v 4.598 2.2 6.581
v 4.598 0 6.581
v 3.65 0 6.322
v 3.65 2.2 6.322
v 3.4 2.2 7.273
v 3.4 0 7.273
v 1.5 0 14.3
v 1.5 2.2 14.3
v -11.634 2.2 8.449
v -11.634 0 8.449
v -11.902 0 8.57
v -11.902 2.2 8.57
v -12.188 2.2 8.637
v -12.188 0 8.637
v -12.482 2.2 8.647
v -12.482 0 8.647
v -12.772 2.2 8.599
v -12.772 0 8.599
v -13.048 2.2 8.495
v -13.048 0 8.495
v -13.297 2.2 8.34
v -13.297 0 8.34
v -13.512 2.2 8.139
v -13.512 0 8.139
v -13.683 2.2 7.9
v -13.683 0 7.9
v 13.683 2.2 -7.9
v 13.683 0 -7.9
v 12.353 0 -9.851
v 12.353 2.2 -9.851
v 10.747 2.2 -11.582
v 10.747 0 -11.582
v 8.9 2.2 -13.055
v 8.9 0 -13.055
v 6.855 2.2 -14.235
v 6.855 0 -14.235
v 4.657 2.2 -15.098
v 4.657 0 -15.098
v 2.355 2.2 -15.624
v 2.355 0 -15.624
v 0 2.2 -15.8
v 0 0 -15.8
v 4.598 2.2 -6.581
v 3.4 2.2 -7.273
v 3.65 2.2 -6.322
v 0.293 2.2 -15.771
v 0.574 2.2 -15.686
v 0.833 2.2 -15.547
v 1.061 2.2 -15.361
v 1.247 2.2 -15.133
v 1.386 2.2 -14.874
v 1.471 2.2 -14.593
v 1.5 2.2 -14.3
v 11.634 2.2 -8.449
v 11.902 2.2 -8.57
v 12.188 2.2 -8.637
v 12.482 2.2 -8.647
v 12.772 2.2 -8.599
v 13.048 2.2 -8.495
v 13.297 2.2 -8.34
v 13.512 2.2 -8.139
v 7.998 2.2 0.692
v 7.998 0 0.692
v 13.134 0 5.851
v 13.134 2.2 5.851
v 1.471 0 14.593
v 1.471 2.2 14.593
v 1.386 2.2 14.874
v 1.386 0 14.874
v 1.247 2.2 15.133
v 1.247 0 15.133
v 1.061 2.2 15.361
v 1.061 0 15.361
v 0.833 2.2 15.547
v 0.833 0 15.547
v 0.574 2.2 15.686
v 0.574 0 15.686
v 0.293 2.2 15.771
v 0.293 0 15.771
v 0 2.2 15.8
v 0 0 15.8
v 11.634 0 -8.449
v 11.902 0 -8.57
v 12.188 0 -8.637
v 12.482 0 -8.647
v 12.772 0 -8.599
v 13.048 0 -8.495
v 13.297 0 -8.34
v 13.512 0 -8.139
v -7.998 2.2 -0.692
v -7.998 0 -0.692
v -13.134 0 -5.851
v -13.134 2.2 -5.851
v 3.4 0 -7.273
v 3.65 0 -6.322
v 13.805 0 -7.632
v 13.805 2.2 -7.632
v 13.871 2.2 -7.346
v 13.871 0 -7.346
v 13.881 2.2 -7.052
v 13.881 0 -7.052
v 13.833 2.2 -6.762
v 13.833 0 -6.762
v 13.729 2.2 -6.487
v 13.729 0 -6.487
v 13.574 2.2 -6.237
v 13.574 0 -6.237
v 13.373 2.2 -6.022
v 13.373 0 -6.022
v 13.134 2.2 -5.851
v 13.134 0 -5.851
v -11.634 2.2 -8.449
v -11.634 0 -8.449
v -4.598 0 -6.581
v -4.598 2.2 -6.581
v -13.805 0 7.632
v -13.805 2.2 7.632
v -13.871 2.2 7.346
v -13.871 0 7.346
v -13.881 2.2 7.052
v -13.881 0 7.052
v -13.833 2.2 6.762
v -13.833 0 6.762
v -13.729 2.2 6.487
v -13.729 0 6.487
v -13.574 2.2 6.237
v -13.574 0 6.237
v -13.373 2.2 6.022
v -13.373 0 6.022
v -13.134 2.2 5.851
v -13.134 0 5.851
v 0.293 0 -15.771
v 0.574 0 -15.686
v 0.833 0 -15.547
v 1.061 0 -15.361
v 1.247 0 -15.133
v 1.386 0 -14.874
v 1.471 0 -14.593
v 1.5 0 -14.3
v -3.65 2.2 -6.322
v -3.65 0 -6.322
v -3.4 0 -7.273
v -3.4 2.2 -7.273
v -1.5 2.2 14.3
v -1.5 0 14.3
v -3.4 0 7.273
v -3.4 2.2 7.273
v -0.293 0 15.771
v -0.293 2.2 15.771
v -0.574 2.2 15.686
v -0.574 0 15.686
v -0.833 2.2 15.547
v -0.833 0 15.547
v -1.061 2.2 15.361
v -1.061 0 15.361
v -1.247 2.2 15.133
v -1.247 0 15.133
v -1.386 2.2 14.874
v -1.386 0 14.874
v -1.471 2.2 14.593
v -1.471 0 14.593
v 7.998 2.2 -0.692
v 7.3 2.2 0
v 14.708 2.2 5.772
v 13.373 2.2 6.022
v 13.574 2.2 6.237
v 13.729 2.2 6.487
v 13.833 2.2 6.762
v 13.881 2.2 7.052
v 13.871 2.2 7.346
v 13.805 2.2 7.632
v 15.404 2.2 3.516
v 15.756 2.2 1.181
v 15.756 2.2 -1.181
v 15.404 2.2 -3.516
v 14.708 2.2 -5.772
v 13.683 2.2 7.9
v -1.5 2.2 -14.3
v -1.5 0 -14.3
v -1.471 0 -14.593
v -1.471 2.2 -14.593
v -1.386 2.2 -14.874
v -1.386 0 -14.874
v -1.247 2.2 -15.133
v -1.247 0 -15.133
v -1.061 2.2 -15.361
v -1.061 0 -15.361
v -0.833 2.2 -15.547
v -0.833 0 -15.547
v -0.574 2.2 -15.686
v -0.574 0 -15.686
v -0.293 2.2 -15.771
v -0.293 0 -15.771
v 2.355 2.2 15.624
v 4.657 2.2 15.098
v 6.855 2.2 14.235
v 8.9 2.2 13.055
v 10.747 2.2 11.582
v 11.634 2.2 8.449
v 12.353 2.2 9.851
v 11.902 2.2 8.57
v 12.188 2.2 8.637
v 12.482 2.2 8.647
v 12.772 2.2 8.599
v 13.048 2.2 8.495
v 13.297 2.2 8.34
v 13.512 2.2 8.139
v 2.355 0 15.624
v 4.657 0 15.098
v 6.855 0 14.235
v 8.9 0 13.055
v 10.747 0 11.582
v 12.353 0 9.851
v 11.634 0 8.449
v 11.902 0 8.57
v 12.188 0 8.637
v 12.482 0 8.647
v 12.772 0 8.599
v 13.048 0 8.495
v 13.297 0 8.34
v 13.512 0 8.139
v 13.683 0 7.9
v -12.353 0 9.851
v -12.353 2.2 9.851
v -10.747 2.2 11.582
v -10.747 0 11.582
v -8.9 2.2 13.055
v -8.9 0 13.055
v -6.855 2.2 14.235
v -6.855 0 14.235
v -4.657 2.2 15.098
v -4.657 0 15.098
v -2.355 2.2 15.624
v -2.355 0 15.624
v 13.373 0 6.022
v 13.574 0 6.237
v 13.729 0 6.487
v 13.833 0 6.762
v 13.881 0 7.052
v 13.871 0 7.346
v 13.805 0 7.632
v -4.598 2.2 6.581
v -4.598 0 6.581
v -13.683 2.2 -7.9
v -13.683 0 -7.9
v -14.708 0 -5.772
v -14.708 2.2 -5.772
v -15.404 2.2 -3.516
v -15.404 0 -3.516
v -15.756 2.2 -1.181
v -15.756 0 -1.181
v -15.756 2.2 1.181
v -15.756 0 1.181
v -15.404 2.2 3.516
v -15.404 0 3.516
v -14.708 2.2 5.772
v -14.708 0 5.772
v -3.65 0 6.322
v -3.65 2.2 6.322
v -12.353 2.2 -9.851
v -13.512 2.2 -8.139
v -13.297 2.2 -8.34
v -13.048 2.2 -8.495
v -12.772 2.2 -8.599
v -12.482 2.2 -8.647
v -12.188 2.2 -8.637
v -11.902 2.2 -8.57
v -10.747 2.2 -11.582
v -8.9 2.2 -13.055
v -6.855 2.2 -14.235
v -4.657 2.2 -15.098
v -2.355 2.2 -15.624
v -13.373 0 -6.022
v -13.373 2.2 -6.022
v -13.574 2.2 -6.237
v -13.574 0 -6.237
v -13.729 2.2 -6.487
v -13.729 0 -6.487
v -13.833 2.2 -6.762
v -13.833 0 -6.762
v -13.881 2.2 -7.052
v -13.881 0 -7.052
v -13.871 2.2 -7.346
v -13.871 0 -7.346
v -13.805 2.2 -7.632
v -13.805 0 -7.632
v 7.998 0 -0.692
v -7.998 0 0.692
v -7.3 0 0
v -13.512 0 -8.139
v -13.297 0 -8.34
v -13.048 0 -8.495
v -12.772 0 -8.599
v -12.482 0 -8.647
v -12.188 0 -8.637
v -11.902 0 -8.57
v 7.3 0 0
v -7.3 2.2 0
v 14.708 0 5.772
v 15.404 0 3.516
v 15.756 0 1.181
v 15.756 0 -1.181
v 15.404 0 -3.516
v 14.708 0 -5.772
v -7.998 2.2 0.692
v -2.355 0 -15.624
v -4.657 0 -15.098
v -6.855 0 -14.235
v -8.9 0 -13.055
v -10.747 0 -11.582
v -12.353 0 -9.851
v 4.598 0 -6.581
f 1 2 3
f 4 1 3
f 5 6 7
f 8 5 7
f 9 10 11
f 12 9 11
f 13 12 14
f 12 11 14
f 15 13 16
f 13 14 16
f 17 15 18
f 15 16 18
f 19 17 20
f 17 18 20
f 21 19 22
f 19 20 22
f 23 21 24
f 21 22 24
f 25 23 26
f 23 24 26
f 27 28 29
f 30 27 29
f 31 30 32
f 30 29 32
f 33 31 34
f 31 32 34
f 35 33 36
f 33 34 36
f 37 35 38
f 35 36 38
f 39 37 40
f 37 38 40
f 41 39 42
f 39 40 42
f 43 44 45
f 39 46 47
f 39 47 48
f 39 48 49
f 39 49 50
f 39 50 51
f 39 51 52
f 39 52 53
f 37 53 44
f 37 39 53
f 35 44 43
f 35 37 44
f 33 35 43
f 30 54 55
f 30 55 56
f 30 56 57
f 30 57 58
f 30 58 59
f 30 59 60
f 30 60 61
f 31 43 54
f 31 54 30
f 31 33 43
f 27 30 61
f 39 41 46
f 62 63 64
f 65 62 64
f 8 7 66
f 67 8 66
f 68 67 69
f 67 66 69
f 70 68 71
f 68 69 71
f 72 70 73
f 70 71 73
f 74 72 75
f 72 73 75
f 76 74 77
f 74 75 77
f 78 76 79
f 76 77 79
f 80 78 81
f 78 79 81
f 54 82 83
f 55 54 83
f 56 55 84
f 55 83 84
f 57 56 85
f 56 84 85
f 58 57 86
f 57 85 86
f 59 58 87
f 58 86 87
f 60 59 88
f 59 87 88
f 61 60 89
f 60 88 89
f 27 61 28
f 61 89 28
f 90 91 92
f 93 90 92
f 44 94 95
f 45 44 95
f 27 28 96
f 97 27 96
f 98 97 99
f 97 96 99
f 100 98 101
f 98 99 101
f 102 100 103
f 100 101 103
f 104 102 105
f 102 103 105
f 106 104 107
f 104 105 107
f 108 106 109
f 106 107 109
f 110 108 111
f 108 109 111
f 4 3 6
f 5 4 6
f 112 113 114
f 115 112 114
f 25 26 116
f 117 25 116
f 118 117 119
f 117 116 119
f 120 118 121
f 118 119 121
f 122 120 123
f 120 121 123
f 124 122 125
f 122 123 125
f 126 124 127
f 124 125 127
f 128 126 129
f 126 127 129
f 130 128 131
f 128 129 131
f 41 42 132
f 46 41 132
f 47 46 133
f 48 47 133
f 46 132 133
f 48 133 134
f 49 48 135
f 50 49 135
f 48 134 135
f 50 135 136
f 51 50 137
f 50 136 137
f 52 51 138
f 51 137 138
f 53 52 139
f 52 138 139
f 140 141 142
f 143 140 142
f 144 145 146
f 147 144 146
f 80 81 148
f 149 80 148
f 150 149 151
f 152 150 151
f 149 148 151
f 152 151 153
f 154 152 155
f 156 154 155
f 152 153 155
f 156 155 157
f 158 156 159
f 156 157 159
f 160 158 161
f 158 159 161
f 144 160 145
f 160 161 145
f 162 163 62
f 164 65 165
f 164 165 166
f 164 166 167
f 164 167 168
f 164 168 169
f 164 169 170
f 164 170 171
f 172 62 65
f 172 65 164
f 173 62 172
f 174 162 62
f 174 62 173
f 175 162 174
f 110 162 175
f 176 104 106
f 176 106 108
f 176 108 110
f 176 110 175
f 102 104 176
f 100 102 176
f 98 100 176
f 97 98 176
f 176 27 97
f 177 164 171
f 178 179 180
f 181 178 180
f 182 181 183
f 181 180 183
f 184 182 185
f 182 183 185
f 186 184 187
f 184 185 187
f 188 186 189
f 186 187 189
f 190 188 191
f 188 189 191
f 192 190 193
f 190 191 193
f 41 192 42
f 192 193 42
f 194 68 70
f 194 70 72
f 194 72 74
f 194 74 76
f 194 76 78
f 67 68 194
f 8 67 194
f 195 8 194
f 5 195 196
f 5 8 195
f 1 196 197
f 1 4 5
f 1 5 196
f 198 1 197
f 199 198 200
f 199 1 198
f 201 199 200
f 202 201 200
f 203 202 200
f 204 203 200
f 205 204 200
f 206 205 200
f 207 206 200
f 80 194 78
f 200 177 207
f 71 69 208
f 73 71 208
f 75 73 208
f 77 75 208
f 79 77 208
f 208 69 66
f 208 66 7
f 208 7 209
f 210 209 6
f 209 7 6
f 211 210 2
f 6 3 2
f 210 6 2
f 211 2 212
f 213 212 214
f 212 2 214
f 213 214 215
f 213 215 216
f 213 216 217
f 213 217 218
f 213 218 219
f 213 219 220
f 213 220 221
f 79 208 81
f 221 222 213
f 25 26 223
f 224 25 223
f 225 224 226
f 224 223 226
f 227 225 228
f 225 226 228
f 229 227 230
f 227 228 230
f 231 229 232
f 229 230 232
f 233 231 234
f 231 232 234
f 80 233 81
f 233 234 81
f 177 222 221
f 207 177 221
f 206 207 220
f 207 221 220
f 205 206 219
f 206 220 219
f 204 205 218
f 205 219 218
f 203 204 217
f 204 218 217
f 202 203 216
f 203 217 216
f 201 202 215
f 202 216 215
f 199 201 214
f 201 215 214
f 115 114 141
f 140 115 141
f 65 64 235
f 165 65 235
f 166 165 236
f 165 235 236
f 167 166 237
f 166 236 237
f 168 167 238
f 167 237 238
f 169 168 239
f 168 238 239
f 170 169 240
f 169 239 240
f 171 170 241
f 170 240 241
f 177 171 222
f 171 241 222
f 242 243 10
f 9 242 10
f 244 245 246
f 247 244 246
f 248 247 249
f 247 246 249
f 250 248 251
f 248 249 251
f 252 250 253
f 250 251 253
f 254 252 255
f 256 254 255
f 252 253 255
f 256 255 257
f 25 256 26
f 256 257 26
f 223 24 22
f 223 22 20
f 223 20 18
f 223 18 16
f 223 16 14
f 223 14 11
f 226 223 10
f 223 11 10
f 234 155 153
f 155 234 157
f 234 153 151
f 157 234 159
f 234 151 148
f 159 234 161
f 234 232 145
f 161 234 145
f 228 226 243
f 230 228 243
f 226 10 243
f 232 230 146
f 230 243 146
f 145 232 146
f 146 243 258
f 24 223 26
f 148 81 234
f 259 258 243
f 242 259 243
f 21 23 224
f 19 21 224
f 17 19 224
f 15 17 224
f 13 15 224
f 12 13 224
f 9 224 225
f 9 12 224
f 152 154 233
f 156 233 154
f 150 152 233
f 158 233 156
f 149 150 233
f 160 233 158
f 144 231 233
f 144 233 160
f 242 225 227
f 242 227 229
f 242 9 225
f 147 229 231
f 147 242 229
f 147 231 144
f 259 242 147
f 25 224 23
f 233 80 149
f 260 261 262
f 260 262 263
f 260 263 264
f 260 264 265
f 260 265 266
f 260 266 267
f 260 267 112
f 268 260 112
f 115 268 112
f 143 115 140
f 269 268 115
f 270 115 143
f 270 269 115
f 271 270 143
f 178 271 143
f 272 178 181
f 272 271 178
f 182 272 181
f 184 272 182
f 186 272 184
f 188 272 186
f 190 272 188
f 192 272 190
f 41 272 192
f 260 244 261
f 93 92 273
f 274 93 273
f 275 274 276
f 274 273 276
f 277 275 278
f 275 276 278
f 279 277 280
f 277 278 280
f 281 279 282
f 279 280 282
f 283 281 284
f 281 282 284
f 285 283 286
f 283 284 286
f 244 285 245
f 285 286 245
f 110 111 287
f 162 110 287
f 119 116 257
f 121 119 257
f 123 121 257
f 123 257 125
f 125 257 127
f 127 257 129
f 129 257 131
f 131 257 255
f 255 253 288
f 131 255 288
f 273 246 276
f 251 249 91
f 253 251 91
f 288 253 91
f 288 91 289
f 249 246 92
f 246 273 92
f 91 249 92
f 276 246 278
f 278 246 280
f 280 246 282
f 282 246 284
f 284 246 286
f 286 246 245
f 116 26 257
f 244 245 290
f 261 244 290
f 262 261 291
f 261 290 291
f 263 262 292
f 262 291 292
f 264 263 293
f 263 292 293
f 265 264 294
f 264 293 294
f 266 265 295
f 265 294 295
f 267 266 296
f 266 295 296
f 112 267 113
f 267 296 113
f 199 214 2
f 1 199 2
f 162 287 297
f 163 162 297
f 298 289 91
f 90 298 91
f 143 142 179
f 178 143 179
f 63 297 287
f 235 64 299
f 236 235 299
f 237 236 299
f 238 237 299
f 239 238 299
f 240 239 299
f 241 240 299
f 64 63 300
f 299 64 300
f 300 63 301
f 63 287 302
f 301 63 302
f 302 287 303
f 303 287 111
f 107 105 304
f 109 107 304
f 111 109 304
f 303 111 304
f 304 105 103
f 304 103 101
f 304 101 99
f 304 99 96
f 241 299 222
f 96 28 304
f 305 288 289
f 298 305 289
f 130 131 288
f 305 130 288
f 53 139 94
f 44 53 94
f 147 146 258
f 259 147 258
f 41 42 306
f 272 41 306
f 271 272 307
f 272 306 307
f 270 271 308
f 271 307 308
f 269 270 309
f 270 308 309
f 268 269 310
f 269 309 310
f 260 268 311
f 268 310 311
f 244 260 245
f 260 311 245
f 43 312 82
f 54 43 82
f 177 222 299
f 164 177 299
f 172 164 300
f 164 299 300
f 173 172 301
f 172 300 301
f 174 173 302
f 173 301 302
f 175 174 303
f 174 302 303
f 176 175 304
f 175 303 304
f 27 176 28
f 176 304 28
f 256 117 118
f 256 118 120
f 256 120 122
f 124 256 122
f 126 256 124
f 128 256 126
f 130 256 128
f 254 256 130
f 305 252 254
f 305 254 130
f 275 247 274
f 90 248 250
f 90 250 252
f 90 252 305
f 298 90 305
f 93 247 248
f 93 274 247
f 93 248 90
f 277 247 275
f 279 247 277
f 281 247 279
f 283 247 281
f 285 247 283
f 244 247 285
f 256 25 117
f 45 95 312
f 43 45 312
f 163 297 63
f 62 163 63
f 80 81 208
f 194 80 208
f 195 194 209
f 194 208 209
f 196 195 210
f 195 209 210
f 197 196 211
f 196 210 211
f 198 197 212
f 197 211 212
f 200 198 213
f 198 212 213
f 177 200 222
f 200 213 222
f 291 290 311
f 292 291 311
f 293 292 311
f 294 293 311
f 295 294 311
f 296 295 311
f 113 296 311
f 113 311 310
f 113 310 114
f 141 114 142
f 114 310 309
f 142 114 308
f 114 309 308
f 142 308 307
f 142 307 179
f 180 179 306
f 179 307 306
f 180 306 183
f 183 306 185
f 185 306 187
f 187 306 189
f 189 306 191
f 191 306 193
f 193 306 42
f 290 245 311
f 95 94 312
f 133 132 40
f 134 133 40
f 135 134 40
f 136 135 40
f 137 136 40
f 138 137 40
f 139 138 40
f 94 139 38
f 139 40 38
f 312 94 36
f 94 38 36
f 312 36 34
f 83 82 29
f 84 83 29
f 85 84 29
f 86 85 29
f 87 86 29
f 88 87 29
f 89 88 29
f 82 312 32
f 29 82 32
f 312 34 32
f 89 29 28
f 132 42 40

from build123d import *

# Parameters (mm, degrees)
SKETCH_1_R          = 15.8
EXTRUDE_1_DEPTH     = 2.2
CUT_EXTRUDE_2_DEPTH = 2.2


with BuildPart() as part:
    # 草圖1 → 填料-伸長1 (new body)
    with BuildSketch(Plane(origin=(0, 0, 0), x_dir=(1, 0, 0), z_dir=(0, 1, 0))):
        Circle(SKETCH_1_R)
    extrude(amount=EXTRUDE_1_DEPTH)

    # 草圖3 → 除料-伸長2 (cut)
    with BuildSketch(Plane.XZ):
        with BuildLine():
            Line((-1.5, 14.3), (-3.4, 7.272575881))
            Line((-3.4, 7.272575881), (-3.650072203, 6.322110506))
            Line((-3.650072203, 6.322110506), (-4.598235464, 6.580774314))
            Line((-4.598235464, 6.580774314), (-11.634163274, 8.449038106))
            ThreePointArc((-11.634163274, 8.449038106), (-12.772391842, 8.598888739), (-13.68320138, 7.9))
            ThreePointArc((-13.68320138, 7.9), (-13.833052014, 6.761771432), (-13.134163274, 5.850961894))
            Line((-13.134163274, 5.850961894), (-7.998235464, 0.691801568))
            Line((-7.998235464, 0.691801568), (-7.300144405, 0))
            Line((-7.300144405, 0), (-7.998235464, -0.691801568))
            Line((-7.998235464, -0.691801568), (-13.134163274, -5.850961894))
            ThreePointArc((-13.134163274, -5.850961894), (-13.833052014, -6.761771432), (-13.68320138, -7.9))
            ThreePointArc((-13.68320138, -7.9), (-12.772391842, -8.598888739), (-11.634163274, -8.449038106))
            Line((-11.634163274, -8.449038106), (-4.598235464, -6.580774314))
            Line((-4.598235464, -6.580774314), (-3.650072203, -6.322110506))
            Line((-3.650072203, -6.322110506), (-3.4, -7.272575881))
            Line((-3.4, -7.272575881), (-1.5, -14.3))
            ThreePointArc((-1.5, -14.3), (-1.060660172, -15.360660172), (0, -15.8))
            ThreePointArc((0, -15.8), (1.060660172, -15.360660172), (1.5, -14.3))
            Line((1.5, -14.3), (3.4, -7.272575881))
            Line((3.4, -7.272575881), (3.650072203, -6.322110506))
            Line((3.650072203, -6.322110506), (4.598235464, -6.580774314))
            Line((4.598235464, -6.580774314), (11.634163274, -8.449038106))
            ThreePointArc((11.634163274, -8.449038106), (12.772391842, -8.598888739), (13.68320138, -7.9))
            ThreePointArc((13.68320138, -7.9), (13.833052014, -6.761771432), (13.134163274, -5.850961894))
            Line((13.134163274, -5.850961894), (7.998235464, -0.691801568))
            Line((7.998235464, -0.691801568), (7.300144405, 0))
            Line((7.300144405, 0), (7.998235464, 0.691801568))
            Line((7.998235464, 0.691801568), (13.134163274, 5.850961894))
            ThreePointArc((13.134163274, 5.850961894), (13.833052014, 6.761771432), (13.68320138, 7.9))
            ThreePointArc((13.68320138, 7.9), (12.772391842, 8.598888739), (11.634163274, 8.449038106))
            Line((11.634163274, 8.449038106), (4.598235464, 6.580774314))
            Line((4.598235464, 6.580774314), (3.650072203, 6.322110506))
            Line((3.650072203, 6.322110506), (3.4, 7.272575881))
            Line((3.4, 7.272575881), (1.5, 14.3))
            ThreePointArc((1.5, 14.3), (1.060660172, 15.360660172), (0, 15.8))
            ThreePointArc((0, 15.8), (-1.060660172, 15.360660172), (-1.5, 14.3))
        make_face()
    extrude(amount=-CUT_EXTRUDE_2_DEPTH, mode=Mode.SUBTRACT)


solid = part.part
